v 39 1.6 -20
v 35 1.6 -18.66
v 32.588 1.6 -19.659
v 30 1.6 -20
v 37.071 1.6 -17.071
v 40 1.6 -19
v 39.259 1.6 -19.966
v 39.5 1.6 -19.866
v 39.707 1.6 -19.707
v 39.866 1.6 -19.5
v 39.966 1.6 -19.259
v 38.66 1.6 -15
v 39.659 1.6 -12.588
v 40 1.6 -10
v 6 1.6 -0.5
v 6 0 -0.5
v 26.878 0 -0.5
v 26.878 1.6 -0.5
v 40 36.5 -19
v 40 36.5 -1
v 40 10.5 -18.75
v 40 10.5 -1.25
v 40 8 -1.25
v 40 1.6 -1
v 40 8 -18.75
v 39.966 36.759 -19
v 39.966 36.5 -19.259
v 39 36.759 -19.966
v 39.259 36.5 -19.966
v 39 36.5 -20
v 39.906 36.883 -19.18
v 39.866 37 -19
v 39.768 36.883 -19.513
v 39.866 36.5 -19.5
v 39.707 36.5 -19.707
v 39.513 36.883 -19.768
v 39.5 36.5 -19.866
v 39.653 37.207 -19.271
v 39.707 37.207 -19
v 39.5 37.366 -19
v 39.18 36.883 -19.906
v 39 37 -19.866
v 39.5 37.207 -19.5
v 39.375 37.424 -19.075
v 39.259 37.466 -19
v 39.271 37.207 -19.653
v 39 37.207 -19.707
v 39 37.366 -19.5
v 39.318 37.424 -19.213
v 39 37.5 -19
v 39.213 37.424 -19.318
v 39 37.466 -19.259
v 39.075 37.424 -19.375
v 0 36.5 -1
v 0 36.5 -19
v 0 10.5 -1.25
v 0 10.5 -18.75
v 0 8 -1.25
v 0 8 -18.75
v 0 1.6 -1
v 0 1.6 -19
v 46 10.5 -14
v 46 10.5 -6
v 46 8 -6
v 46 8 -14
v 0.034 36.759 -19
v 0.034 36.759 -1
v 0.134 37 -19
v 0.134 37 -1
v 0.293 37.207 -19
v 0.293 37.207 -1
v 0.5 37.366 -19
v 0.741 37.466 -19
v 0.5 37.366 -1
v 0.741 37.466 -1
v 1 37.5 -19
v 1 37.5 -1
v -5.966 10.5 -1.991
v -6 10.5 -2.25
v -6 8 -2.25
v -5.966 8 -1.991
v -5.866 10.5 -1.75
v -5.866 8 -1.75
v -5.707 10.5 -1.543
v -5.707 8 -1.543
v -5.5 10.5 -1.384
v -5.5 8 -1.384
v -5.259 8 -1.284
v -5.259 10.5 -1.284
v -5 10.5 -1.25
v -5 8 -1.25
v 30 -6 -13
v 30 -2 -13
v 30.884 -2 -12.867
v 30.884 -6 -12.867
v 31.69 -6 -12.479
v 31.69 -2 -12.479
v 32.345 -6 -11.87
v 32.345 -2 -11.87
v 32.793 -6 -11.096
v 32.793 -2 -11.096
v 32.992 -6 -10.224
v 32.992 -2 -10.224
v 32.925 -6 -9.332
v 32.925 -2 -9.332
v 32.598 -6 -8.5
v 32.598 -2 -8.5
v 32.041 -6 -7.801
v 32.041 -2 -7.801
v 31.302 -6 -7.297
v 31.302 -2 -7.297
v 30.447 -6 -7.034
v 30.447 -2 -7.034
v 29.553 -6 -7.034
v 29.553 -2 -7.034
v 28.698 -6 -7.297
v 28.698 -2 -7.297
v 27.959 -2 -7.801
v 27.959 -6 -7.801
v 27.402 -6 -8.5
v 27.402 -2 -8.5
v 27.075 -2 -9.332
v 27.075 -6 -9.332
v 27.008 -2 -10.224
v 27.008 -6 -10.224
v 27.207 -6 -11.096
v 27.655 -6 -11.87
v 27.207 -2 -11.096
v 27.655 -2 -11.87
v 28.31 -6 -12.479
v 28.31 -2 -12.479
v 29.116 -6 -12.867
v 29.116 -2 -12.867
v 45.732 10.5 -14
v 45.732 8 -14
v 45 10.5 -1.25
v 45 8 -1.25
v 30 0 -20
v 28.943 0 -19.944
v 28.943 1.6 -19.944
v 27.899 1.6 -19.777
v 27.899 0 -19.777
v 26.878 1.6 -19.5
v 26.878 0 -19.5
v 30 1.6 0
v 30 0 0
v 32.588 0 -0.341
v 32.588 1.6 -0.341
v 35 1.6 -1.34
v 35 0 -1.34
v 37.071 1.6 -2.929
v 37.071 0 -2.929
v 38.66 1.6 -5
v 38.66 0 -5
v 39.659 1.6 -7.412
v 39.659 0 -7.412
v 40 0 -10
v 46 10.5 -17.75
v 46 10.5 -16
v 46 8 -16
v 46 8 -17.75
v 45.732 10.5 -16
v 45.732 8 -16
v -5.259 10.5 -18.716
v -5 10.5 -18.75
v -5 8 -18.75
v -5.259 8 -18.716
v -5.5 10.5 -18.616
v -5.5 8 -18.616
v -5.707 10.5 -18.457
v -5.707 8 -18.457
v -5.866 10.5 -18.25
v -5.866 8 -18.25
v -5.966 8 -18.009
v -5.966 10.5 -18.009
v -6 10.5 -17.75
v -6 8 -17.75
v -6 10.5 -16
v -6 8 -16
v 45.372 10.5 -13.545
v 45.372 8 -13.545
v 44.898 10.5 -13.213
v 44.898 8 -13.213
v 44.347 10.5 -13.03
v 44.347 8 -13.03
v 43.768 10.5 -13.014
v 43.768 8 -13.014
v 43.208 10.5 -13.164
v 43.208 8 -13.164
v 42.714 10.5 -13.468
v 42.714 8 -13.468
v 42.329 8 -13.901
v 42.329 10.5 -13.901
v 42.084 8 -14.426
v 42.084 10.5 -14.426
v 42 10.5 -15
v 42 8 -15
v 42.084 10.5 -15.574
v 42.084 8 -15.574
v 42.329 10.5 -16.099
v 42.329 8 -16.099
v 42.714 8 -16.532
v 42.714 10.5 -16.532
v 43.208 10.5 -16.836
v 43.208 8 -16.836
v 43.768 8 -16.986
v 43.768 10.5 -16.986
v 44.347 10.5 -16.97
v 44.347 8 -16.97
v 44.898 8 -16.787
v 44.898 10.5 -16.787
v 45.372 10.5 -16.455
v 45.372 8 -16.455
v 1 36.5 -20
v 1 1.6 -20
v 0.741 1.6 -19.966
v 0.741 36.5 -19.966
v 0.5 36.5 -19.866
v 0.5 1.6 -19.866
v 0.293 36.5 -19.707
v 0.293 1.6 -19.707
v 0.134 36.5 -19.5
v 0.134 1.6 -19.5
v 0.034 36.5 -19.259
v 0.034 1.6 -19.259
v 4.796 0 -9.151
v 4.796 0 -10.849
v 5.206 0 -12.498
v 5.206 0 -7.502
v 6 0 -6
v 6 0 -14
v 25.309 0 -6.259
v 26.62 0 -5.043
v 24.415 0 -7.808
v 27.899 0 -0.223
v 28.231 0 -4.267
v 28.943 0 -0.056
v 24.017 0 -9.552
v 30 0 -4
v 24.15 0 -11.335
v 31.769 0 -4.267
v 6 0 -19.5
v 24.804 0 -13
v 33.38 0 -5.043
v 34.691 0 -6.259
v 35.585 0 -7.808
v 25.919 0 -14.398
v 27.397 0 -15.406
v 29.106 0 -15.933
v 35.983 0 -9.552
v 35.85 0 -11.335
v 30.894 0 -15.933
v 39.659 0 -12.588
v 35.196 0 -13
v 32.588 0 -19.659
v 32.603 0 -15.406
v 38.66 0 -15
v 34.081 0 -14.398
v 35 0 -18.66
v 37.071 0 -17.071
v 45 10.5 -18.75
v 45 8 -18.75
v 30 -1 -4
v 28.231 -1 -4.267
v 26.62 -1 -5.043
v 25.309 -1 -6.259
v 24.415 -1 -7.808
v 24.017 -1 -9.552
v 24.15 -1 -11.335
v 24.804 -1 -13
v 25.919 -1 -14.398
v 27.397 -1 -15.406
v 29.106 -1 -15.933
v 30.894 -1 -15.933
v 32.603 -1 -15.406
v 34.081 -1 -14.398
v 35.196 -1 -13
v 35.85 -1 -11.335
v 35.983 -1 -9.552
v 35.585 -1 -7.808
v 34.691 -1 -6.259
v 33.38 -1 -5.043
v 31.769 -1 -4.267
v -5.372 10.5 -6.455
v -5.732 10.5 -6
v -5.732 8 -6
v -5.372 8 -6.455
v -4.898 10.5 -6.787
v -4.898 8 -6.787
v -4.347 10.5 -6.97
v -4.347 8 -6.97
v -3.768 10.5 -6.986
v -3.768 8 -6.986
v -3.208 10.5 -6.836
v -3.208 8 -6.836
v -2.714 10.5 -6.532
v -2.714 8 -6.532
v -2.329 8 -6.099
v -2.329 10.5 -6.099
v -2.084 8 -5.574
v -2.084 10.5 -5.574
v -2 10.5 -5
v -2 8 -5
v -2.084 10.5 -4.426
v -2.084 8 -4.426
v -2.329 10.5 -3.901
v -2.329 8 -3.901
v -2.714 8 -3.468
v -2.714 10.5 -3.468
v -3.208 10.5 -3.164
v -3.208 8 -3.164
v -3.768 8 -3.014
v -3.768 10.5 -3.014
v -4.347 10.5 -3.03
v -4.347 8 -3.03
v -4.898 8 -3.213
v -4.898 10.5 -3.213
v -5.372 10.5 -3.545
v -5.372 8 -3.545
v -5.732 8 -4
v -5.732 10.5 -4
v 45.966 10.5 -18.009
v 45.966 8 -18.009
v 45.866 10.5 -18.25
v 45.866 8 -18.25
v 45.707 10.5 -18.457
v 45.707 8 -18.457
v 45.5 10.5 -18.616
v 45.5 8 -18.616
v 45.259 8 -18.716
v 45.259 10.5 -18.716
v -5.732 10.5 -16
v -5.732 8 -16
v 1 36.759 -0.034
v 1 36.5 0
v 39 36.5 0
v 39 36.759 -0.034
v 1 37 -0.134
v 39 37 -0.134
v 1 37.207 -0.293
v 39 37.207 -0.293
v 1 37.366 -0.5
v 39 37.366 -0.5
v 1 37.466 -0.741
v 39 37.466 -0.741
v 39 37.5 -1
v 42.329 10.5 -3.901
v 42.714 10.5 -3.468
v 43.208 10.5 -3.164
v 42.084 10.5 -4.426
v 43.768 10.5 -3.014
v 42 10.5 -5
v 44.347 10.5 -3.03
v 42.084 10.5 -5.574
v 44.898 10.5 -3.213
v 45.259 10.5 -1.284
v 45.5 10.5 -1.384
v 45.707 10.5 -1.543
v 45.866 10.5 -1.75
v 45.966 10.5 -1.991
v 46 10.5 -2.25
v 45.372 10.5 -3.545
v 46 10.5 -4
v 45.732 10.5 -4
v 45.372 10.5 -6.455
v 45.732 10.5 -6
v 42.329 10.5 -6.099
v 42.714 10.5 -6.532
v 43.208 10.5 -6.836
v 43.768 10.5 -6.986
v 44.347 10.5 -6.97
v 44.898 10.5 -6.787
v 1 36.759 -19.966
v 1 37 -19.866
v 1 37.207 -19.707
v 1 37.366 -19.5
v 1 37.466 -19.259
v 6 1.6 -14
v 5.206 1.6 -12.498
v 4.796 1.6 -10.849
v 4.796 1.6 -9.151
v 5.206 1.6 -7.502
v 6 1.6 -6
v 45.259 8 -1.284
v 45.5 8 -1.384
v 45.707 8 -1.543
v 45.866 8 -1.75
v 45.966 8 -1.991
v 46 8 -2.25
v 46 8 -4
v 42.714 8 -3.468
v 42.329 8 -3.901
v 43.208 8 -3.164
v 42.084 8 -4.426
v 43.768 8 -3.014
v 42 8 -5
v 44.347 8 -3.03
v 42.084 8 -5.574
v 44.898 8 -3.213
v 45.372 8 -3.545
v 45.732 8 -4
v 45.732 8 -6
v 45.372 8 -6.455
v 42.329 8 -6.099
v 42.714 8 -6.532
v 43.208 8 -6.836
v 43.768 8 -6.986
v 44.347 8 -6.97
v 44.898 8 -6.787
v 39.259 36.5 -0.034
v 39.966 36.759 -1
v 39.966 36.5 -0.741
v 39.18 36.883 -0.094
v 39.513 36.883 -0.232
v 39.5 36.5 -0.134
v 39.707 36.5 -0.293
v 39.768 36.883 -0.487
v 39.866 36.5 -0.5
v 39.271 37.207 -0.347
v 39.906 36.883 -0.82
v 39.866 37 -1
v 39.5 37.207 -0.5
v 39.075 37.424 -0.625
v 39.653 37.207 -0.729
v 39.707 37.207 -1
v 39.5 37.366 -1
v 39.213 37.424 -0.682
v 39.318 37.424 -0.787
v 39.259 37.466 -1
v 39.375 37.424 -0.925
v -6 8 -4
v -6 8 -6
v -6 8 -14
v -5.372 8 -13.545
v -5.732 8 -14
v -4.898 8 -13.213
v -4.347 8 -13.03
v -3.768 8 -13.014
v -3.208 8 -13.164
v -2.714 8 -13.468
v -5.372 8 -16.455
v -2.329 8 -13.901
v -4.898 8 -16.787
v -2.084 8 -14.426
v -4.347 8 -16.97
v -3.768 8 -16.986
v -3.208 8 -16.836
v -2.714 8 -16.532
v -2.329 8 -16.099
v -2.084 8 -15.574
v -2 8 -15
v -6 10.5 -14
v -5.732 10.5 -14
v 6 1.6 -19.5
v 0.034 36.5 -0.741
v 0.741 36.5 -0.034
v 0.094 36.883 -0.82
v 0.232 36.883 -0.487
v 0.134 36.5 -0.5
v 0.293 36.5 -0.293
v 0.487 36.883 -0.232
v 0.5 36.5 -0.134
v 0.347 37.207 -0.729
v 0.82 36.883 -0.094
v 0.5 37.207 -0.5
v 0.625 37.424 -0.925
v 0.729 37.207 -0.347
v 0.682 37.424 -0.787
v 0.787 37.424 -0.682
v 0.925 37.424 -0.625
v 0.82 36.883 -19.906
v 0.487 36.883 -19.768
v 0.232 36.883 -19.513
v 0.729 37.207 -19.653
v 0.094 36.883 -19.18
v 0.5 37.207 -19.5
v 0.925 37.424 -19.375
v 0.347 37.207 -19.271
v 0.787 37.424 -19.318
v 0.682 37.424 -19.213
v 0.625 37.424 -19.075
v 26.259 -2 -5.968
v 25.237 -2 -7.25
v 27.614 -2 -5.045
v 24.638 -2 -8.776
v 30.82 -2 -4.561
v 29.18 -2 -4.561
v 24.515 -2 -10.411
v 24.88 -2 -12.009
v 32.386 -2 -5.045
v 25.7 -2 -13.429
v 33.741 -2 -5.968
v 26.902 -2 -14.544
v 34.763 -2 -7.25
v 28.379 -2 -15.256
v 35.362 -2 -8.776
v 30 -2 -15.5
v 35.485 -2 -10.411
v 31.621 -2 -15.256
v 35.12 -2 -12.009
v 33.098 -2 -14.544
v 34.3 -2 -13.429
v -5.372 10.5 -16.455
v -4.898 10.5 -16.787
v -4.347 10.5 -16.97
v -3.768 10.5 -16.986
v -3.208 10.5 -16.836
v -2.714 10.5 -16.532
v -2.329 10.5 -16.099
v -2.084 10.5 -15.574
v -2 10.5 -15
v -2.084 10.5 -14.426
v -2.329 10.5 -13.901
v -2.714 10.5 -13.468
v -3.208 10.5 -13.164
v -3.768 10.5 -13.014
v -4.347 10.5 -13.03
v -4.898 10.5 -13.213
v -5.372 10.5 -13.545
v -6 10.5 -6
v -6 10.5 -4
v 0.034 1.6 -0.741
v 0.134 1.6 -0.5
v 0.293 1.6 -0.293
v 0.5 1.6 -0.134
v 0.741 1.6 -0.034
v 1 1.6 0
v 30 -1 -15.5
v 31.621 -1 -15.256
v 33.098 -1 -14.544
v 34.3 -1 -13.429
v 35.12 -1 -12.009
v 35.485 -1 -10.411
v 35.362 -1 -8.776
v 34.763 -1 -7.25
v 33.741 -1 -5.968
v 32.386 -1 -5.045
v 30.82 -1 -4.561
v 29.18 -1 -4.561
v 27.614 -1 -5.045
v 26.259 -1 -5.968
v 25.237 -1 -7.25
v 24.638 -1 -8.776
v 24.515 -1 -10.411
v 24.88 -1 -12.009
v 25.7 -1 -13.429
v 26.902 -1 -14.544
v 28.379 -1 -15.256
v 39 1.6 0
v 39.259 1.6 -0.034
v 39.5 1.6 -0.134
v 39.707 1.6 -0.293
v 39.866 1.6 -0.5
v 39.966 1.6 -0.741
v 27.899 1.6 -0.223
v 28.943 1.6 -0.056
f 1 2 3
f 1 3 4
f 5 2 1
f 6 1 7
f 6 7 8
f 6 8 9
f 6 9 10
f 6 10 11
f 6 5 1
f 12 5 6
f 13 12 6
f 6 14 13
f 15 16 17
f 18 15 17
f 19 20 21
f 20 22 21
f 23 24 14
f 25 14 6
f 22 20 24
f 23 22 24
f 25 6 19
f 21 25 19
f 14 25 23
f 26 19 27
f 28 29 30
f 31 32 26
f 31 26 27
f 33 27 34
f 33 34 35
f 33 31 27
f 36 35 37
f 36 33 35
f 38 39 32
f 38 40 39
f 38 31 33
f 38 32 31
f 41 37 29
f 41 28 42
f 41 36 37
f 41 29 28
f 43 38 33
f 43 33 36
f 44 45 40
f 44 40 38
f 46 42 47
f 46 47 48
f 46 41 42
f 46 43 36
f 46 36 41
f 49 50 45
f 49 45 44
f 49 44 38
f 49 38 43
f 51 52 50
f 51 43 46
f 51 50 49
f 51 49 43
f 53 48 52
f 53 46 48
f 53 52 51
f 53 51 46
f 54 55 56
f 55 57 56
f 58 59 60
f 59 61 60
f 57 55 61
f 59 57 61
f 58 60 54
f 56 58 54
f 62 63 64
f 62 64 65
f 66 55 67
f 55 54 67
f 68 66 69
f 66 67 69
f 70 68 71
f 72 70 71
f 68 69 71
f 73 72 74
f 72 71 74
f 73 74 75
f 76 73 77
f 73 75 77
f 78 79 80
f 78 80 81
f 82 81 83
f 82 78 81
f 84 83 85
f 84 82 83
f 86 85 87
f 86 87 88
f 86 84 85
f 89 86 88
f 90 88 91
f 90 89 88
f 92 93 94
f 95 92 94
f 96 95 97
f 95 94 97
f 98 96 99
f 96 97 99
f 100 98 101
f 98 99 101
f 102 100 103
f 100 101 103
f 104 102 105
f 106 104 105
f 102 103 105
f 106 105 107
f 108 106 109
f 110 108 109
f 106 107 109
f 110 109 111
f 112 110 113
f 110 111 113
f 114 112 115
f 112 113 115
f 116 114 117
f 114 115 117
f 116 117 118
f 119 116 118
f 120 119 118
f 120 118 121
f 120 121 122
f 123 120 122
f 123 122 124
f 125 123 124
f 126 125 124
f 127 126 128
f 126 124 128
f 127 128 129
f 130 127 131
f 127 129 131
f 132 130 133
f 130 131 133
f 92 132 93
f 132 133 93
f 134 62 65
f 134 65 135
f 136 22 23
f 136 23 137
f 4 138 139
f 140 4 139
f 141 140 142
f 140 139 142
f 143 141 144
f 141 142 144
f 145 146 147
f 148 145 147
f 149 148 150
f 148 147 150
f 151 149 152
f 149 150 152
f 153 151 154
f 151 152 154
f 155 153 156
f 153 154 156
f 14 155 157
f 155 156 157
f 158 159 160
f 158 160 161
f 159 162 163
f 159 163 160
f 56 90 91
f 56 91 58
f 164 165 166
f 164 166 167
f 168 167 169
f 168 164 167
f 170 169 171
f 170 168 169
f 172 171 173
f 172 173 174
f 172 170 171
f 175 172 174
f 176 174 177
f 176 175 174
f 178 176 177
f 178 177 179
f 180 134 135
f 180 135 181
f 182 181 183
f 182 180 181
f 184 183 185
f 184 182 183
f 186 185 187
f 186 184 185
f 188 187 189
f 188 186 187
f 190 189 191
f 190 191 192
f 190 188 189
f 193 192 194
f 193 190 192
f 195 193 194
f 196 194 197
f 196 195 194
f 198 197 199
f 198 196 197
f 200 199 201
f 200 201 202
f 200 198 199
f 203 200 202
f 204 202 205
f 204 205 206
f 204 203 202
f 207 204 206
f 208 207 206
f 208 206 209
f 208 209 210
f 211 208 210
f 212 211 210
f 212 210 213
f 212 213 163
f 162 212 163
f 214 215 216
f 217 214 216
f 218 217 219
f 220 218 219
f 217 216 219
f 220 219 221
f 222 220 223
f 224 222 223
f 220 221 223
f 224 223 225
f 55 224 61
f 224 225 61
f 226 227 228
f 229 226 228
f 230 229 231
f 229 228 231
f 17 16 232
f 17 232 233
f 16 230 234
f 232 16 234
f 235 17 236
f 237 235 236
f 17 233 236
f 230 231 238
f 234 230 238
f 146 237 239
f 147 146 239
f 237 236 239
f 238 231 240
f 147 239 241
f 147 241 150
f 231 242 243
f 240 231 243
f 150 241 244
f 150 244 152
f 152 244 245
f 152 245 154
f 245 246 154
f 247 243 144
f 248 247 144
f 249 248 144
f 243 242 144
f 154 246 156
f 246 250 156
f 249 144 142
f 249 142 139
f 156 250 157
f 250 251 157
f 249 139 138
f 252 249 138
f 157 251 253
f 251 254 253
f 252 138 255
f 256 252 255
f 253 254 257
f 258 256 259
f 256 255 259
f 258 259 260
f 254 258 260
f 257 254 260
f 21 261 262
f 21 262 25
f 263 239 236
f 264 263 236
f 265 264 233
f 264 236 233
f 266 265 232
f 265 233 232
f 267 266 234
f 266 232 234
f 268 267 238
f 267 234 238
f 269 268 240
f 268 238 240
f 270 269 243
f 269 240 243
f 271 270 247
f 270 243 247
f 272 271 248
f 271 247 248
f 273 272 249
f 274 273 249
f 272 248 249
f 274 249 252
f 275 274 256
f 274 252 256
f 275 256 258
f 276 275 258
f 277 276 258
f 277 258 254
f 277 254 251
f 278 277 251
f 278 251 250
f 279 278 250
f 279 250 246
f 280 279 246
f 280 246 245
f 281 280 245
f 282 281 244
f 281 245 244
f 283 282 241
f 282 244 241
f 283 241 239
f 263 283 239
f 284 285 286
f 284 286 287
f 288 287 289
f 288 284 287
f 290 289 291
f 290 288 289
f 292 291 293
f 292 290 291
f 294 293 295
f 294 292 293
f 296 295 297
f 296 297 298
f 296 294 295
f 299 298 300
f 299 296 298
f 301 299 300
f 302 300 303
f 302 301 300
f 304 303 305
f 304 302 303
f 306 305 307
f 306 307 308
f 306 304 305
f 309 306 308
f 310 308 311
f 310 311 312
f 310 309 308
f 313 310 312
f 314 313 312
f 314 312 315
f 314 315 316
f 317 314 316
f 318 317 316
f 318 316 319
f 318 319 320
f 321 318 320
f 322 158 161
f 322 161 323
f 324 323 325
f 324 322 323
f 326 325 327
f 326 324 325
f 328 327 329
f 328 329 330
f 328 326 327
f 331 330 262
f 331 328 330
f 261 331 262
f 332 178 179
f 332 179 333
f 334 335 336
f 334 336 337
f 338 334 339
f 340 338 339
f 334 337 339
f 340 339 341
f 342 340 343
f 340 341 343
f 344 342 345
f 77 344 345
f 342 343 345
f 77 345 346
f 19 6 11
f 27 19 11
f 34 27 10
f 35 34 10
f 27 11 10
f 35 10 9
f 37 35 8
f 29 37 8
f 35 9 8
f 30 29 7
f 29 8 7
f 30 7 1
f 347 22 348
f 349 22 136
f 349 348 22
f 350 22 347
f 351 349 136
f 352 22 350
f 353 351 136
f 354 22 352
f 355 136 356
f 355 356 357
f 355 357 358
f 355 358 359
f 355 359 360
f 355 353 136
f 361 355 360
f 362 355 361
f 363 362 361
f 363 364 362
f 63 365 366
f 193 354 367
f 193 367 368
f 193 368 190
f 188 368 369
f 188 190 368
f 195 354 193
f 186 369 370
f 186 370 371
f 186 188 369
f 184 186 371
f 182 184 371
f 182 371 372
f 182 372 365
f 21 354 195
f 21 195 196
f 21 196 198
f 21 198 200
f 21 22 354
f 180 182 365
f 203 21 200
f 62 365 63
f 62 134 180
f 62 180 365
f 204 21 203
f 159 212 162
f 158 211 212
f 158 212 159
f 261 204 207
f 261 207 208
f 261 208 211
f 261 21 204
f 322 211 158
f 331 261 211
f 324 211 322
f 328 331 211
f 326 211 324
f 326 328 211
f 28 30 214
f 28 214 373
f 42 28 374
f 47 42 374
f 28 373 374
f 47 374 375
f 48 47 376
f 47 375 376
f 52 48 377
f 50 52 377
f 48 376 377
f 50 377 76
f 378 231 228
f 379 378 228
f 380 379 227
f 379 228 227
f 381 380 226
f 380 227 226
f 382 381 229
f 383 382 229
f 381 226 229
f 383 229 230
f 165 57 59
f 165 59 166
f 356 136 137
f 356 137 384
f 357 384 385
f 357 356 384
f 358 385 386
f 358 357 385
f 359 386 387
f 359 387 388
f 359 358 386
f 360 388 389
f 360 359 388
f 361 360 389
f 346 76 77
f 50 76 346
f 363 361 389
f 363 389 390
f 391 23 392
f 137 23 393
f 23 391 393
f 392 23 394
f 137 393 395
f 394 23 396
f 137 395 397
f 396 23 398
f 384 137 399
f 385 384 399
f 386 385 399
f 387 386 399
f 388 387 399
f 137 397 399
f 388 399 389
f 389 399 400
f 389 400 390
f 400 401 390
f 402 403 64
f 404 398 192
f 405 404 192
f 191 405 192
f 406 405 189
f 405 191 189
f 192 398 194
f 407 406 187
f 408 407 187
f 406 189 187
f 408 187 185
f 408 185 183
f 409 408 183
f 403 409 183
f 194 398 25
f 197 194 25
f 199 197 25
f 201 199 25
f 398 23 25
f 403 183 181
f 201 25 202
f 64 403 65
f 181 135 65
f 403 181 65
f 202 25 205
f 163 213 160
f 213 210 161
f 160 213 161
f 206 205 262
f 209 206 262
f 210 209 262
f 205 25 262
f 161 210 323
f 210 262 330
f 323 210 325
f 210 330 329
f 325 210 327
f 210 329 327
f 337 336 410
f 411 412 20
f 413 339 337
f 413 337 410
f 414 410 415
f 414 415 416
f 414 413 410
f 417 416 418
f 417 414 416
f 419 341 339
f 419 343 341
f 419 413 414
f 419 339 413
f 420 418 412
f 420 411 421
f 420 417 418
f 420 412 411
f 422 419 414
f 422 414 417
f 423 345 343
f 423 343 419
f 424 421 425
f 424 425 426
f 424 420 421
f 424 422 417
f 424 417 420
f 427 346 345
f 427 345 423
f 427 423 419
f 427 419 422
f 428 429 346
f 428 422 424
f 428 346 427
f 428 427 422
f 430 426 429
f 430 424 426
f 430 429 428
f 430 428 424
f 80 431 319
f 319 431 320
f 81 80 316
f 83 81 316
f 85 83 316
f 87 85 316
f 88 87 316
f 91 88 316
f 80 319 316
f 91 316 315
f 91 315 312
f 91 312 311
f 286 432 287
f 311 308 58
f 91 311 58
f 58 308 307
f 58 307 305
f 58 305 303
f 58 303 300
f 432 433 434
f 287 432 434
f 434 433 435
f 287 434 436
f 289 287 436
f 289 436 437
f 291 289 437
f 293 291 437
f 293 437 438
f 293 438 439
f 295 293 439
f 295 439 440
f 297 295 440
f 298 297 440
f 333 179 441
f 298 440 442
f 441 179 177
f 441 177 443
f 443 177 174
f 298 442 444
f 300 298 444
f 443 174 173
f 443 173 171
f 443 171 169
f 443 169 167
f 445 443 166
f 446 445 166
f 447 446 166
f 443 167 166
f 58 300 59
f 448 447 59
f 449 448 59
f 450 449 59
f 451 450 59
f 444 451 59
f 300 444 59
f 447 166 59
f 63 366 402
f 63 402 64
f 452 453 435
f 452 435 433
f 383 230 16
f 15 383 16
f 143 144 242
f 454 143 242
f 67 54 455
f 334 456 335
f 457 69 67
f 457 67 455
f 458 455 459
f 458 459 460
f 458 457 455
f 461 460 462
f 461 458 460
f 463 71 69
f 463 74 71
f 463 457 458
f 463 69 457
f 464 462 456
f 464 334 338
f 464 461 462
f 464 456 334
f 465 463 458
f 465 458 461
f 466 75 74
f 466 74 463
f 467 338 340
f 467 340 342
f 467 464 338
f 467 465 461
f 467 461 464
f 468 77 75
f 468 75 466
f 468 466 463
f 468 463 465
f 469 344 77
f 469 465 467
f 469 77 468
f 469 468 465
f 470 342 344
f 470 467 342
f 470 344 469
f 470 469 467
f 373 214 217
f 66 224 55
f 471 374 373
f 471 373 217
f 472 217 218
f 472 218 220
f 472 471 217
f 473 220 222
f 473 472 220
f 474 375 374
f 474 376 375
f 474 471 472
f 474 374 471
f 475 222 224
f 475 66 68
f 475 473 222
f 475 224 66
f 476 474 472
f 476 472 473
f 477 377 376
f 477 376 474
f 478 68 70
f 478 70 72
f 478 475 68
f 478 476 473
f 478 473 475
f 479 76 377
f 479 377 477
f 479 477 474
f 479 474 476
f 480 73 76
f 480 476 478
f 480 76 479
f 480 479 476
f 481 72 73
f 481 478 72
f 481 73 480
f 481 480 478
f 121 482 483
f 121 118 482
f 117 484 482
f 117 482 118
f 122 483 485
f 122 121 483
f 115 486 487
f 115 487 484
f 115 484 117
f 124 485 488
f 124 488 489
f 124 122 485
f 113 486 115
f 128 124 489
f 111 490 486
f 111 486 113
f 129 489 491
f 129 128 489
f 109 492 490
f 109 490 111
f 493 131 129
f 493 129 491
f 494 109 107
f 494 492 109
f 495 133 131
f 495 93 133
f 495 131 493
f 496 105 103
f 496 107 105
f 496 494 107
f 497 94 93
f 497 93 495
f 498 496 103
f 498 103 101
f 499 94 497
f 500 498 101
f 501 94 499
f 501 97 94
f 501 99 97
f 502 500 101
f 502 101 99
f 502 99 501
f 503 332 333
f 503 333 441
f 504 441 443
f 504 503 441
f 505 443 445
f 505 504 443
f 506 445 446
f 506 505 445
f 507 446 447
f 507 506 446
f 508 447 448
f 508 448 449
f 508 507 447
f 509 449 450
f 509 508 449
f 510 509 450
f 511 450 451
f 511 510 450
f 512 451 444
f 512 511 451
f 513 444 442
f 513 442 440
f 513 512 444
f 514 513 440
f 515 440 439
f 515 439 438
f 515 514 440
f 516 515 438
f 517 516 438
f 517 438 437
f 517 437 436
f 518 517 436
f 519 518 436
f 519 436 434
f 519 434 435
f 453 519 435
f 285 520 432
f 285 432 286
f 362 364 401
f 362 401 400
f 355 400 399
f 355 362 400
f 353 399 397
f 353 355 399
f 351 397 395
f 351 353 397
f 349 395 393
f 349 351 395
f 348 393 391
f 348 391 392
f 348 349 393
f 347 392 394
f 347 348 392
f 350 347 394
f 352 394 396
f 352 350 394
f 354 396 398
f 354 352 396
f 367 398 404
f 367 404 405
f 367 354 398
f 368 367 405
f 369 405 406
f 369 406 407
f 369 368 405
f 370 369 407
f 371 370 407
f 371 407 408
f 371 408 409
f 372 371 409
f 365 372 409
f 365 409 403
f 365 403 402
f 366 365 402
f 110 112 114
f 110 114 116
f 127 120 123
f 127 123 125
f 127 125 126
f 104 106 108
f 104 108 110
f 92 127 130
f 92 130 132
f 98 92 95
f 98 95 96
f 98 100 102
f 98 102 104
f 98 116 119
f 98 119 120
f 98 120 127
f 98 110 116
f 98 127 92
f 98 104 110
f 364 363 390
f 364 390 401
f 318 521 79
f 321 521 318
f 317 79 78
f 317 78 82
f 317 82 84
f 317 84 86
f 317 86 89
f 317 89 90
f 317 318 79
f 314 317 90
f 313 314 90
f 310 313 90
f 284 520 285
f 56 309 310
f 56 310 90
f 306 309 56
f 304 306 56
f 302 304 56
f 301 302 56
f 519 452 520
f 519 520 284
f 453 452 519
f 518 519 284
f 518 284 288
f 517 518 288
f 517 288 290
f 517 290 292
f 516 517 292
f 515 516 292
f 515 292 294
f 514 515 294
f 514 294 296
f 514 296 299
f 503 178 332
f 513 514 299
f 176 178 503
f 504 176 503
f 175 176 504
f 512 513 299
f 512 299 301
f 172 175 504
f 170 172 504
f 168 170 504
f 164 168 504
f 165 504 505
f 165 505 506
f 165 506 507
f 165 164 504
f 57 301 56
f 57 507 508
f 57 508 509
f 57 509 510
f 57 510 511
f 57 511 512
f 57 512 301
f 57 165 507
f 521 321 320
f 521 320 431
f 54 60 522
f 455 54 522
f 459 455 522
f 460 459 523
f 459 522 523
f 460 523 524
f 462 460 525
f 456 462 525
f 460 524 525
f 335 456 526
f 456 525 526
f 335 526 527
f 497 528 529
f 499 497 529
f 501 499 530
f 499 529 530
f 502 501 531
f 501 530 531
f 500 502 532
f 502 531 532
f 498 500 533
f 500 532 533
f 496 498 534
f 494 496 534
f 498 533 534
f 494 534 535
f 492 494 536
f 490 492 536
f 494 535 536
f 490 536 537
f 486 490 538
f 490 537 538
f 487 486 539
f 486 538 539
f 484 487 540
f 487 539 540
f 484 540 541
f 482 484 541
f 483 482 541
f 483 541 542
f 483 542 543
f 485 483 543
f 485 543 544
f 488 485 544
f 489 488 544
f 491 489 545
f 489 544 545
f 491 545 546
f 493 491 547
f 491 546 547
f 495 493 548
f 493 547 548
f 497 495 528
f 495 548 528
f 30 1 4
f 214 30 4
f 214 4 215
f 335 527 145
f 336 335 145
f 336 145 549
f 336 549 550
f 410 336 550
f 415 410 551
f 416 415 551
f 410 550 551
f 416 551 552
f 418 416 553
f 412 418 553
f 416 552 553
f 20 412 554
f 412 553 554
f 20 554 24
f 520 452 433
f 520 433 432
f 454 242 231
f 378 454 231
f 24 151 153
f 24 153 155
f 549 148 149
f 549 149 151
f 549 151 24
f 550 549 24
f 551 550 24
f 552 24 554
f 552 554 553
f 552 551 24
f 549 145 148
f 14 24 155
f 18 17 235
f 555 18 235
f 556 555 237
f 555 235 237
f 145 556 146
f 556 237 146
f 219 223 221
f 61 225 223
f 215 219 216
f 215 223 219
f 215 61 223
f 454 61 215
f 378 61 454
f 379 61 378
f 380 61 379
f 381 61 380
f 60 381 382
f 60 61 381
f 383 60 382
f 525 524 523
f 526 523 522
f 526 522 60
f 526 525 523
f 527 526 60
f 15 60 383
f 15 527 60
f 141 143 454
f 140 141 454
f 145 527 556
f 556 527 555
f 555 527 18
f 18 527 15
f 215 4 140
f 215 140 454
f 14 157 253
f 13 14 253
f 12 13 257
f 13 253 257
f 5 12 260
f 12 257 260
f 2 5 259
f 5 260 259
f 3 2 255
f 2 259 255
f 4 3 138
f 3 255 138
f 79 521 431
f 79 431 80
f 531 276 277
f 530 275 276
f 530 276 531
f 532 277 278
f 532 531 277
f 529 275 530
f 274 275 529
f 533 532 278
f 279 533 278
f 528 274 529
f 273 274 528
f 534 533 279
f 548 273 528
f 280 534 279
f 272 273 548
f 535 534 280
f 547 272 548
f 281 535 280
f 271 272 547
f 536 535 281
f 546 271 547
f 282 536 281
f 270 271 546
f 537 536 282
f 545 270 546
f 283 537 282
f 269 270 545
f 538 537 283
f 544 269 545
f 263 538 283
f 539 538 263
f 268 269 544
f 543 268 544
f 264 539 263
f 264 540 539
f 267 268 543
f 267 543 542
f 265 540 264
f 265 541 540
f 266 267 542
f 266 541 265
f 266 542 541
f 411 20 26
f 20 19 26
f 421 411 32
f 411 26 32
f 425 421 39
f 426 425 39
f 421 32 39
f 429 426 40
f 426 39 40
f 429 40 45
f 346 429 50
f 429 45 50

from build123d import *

# Parameters (mm, degrees)
Y_KSEKLIK_EKSTR_ZYON1_DEPTH = 37.5
RADYUS1_R                   = 1
Y_KSEKLIK_EKSTR_ZYON3_DEPTH = 2.5
KES_EKSTR_ZYON1_DEPTH       = 1.6
IZIM4_R                     = 6
Y_KSEKLIK_EKSTR_ZYON4_DEPTH = 1
IZIM5_R                     = 5.5
Y_KSEKLIK_EKSTR_ZYON5_DEPTH = 1
IZIM6_R                     = 3
Y_KSEKLIK_EKSTR_ZYON6_DEPTH = 4


with BuildPart() as part:
    # Çizim1 → Yükseklik-Ekstrüzyon1 (new body)
    with BuildSketch(Plane(origin=(0, 0, 0), x_dir=(1, 0, 0), z_dir=(0, 1, 0))):
        with BuildLine():
            Line((1, 0), (39, 0))
            ThreePointArc((39, 0), (39.707106781, 0.292893219), (40, 1))
            Line((40, 1), (40, 19))
            ThreePointArc((40, 19), (39.707106781, 19.707106781), (39, 20))
            Line((39, 20), (1, 20))
            ThreePointArc((1, 20), (0.292893219, 19.707106781), (0, 19))
            Line((0, 19), (0, 1))
            ThreePointArc((0, 1), (0.292893219, 0.292893219), (1, 0))
        make_face()
    extrude(amount=Y_KSEKLIK_EKSTR_ZYON1_DEPTH)

    # Radyus1
    radyus1_edges = [part.edges().sort_by_distance(p)[0] for p in [
        (0.292893219, 37.5, -19.707106781),
        (0, 37.5, -10),
        (0.292893219, 37.5, -0.292893219),
        (20, 37.5, 0),
        (39.707106781, 37.5, -0.292893219),
        (40, 37.5, -10),
        (39.707106781, 37.5, -19.707106781),
        (20, 37.5, -20),
    ]]
    fillet(radyus1_edges, radius=RADYUS1_R)

    # Çizim2 → Yükseklik-Ekstrüzyon3 (add)
    with BuildSketch(Plane(origin=(0, 10.5, 0), x_dir=(1, 0, 0), z_dir=(0, 1, 0))):
        with BuildLine():
            Line((-5.732050808, 4), (-6, 4))
            Line((-6, 4), (-6, 2.25))
            ThreePointArc((-6, 2.25), (-5.707106781, 1.542893219), (-5, 1.25))
            Line((-5, 1.25), (0, 1.25))
            Line((0, 1.25), (0, 18.75))
            Line((0, 18.75), (-5, 18.75))
            ThreePointArc((-5, 18.75), (-5.707106781, 18.457106781), (-6, 17.75))
            Line((-6, 17.75), (-6, 16))
            Line((-6, 16), (-5.732050808, 16))
            ThreePointArc((-5.732050808, 16), (-2, 15), (-5.732050808, 14))
            Line((-5.732050808, 14), (-6, 14))
            Line((-6, 14), (-6, 6))
            Line((-6, 6), (-5.732050808, 6))
            ThreePointArc((-5.732050808, 6), (-2, 5), (-5.732050808, 4))
        make_face()
        with BuildLine():
            Line((40, 1.25), (45, 1.25))
            ThreePointArc((45, 1.25), (45.707106781, 1.542893219), (46, 2.25))
            Line((46, 2.25), (46, 4))
            Line((46, 4), (45.732050808, 4))
            ThreePointArc((45.732050808, 4), (42, 5), (45.732050808, 6))
            Line((45.732050808, 6), (46, 6))
            Line((46, 6), (46, 14))
            Line((46, 14), (45.732050808, 14))
            ThreePointArc((45.732050808, 14), (42, 15), (45.732050808, 16))
            Line((45.732050808, 16), (46, 16))
            Line((46, 16), (46, 17.75))
            ThreePointArc((46, 17.75), (45.707106781, 18.457106781), (45, 18.75))
            Line((45, 18.75), (40, 18.75))
            Line((40, 18.75), (40, 1.25))
        make_face()
    extrude(amount=-Y_KSEKLIK_EKSTR_ZYON3_DEPTH)

    # Çizim3 → Kes-Ekstrüzyon1 (cut)
    with BuildSketch(Plane.XZ):
        with BuildLine():
            Line((6, -0.5), (26.877501001, -0.5))
            ThreePointArc((26.877501001, -0.5), (28.418861192, -0.125791167), (30.000000044, 0))
            Line((30.000000044, 0), (1, 0))
            ThreePointArc((1, 0), (0.292893219, -0.292893219), (0, -1))
            Line((0, -1), (0, -19))
            ThreePointArc((0, -19), (0.292893219, -19.707106781), (1, -20))
            Line((1, -20), (30.000000006, -20))
            ThreePointArc((30.000000006, -20), (28.418861173, -19.87420883), (26.877501001, -19.5))
            Line((26.877501001, -19.5), (6, -19.5))
            Line((6, -19.5), (6, -14))
            ThreePointArc((6, -14), (4.744562647, -10), (6, -6))
            Line((6, -6), (6, -0.5))
        make_face()
        with BuildLine():
            Line((40, -19), (40, -10))
            ThreePointArc((40, -10), (37.071067814, -17.07106781), (30.000000006, -20))
            Line((30.000000006, -20), (39, -20))
            ThreePointArc((39, -20), (39.707106781, -19.707106781), (40, -19))
        make_face()
        with BuildLine():
            Line((39, 0), (30.000000044, 0))
            ThreePointArc((30.000000044, 0), (37.071067828, -2.928932204), (40, -10))
            Line((40, -10), (40, -1))
            ThreePointArc((40, -1), (39.707106781, -0.292893219), (39, 0))
        make_face()
    extrude(amount=-KES_EKSTR_ZYON1_DEPTH, mode=Mode.SUBTRACT)

    # Çizim4 → Yükseklik-Ekstrüzyon4 (add)
    with BuildSketch(Plane.XZ):
        with Locations(Location((30, -10, 0), (0, 0, 90))):
            Circle(IZIM4_R)
    extrude(amount=Y_KSEKLIK_EKSTR_ZYON4_DEPTH)

    # Çizim5 → Yükseklik-Ekstrüzyon5 (add)
    with BuildSketch(Plane.XZ.offset(1)):
        with Locations(Location((30, -10, 0), (0, 0, 270))):
            Circle(IZIM5_R)
    extrude(amount=Y_KSEKLIK_EKSTR_ZYON5_DEPTH)

    # Çizim6 → Yükseklik-Ekstrüzyon6 (add)
    with BuildSketch(Plane.XZ.offset(2)):
        with Locations(Location((30, -10, 0), (0, 0, 270))):
            Circle(IZIM6_R)
    extrude(amount=Y_KSEKLIK_EKSTR_ZYON6_DEPTH)


solid = part.part
